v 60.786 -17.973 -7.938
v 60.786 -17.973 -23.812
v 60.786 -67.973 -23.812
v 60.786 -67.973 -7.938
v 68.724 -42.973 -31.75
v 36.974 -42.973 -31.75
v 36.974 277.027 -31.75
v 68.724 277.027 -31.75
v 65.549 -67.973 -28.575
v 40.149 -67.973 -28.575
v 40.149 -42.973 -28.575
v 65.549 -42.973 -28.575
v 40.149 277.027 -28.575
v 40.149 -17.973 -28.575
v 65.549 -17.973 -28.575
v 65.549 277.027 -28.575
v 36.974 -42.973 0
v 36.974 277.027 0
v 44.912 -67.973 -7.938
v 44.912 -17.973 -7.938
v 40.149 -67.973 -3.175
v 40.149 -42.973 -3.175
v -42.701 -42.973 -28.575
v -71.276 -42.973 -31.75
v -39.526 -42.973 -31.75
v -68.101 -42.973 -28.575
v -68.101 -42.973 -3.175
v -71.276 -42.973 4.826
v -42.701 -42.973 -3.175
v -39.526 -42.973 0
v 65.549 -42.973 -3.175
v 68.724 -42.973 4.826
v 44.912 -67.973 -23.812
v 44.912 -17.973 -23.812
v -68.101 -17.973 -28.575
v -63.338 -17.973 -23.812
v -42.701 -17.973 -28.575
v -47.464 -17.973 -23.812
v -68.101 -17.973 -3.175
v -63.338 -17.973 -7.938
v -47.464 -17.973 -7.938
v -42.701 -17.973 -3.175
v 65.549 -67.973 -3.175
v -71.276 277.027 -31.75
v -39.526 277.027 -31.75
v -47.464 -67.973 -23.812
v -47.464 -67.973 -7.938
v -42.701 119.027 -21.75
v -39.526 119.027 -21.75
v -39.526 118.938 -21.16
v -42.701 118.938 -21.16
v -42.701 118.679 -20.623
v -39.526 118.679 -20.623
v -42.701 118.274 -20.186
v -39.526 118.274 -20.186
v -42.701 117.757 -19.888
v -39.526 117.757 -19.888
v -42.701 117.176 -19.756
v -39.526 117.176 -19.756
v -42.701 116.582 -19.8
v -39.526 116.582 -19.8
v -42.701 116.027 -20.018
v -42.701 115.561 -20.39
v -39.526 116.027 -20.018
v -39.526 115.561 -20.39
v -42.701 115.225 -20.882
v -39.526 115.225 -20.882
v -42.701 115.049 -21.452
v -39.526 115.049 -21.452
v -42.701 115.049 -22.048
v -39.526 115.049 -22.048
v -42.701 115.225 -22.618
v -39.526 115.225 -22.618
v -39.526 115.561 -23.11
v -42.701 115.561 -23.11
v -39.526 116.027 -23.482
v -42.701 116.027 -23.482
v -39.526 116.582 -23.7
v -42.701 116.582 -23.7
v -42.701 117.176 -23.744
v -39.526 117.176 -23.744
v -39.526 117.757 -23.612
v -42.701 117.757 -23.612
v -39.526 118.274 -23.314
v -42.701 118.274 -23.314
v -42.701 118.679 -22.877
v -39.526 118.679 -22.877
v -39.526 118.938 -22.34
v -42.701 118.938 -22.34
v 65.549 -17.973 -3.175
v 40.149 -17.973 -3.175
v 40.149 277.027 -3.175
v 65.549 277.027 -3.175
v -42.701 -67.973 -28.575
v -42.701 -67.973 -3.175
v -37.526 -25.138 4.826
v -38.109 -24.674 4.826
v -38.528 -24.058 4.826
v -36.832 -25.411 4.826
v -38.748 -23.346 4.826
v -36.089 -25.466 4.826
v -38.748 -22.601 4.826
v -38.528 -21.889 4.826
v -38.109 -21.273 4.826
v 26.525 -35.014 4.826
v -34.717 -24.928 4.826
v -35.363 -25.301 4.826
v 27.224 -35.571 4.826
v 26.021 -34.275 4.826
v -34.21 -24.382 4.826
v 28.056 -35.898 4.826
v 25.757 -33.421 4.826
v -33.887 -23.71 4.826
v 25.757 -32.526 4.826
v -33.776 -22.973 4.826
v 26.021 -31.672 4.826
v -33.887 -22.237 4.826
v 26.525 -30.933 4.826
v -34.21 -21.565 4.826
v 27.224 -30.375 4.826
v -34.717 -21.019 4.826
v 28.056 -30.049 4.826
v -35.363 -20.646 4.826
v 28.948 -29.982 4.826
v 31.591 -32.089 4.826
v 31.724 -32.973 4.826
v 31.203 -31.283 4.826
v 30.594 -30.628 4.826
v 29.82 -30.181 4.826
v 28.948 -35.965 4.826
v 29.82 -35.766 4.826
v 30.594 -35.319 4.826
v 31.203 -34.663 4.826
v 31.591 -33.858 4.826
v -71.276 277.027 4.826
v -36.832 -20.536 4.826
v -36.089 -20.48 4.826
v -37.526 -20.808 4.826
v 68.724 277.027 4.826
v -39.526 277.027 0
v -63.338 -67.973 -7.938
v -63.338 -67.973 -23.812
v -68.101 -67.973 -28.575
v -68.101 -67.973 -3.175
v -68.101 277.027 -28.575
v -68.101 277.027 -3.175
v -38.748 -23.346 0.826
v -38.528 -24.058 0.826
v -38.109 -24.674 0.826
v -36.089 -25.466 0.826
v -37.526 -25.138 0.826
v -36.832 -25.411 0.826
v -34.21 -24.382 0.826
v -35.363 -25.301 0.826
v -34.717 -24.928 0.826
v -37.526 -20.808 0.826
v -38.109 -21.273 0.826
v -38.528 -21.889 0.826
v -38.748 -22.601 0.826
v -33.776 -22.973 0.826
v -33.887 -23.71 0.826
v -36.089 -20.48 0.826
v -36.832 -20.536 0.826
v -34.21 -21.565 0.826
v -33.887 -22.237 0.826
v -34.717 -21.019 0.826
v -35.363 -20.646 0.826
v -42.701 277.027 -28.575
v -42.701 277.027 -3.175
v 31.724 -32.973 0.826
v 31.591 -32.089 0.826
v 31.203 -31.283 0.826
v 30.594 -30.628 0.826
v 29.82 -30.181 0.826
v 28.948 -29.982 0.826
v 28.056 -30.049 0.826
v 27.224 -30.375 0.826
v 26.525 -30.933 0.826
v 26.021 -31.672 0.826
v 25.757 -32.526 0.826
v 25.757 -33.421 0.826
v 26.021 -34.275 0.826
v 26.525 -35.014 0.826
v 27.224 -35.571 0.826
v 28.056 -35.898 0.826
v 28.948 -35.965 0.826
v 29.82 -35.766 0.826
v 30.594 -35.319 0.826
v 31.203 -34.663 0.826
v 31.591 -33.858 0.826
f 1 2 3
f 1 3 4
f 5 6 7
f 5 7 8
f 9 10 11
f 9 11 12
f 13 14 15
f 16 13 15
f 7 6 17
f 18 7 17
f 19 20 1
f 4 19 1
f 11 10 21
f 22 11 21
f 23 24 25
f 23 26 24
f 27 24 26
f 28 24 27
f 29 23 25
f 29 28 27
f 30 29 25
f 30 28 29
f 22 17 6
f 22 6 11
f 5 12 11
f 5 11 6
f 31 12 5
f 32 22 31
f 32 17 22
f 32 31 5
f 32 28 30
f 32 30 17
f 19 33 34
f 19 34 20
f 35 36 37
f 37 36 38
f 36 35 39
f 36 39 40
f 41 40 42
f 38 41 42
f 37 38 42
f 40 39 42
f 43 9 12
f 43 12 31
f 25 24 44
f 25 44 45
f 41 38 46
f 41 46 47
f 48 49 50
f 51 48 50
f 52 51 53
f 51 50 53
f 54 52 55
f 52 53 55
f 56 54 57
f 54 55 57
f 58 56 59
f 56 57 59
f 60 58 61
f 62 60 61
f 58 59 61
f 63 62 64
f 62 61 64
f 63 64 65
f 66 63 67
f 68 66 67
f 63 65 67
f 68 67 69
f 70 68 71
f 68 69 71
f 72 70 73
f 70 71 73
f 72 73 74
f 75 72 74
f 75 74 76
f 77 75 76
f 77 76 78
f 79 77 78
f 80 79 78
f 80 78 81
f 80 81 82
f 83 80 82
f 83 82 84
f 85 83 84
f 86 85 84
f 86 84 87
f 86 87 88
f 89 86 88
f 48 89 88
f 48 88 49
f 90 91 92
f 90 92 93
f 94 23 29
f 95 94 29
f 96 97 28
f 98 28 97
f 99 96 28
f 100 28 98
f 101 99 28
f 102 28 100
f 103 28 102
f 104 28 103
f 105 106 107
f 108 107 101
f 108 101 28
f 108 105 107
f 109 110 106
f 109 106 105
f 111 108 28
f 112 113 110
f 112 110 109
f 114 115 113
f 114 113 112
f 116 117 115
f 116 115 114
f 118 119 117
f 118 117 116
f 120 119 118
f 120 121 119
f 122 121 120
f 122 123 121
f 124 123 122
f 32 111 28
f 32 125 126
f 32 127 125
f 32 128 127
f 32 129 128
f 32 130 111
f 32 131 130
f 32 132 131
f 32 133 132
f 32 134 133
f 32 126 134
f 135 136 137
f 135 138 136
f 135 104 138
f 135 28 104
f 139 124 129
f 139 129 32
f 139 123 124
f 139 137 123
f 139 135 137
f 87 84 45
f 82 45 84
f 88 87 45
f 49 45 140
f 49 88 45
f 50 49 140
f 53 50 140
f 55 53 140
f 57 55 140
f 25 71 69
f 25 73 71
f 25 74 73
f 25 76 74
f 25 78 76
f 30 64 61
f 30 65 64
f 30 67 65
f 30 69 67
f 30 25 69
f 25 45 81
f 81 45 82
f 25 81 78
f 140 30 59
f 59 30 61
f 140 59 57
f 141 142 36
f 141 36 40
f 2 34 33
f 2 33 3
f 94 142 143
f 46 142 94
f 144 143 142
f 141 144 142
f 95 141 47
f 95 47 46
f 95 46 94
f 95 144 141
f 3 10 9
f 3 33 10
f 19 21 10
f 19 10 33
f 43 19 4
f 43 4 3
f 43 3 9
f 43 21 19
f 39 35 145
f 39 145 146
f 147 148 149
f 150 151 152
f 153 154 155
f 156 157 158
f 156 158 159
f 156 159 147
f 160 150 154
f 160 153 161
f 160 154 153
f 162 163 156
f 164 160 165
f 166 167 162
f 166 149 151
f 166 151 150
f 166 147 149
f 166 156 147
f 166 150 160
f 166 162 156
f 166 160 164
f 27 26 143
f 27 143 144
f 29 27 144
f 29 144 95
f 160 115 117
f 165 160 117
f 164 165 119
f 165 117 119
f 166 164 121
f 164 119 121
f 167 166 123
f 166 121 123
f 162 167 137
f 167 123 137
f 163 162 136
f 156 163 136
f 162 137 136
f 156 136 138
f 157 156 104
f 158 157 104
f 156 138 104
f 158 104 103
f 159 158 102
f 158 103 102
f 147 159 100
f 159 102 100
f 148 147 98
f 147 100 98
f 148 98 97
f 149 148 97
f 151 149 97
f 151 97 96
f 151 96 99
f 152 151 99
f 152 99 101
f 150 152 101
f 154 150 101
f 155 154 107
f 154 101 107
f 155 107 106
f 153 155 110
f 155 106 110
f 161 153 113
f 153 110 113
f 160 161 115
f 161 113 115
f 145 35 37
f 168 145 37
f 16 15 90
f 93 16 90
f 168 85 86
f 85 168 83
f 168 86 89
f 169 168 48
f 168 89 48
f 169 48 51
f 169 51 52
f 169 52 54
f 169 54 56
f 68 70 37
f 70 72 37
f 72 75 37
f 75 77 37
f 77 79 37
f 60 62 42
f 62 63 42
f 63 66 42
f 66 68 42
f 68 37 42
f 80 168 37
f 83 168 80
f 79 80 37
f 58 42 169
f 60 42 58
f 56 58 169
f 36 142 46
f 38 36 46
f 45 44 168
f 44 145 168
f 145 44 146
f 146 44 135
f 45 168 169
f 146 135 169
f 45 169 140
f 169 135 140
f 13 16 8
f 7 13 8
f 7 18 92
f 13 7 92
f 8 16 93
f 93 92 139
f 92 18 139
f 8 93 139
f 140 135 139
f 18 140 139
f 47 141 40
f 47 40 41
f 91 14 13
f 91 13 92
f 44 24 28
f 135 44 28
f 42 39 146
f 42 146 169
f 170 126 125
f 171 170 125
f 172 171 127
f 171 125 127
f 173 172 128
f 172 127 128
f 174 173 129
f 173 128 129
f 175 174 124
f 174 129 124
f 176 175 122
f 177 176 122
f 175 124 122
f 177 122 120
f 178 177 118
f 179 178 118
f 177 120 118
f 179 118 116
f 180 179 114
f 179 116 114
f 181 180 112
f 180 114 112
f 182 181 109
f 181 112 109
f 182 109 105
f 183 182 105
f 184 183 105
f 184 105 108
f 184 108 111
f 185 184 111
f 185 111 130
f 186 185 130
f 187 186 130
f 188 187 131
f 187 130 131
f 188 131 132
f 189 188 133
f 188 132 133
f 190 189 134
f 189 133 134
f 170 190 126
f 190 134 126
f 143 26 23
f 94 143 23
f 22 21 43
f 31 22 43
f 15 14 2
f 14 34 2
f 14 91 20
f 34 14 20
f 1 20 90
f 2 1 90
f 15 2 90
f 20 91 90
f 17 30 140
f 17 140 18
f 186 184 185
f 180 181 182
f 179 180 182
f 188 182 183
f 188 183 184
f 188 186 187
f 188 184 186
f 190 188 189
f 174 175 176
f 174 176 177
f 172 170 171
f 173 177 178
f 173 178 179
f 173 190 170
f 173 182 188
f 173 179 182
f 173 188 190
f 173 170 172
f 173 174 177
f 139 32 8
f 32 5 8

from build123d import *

# Parameters (mm, degrees)
F0_W     = 140
F0_H     = 320
F1_DEPTH = 4.826
F2_W     = 31.75
F2_H     = 31.75
F2_W_2   = 25.4
F2_H_2   = 25.4
F3_DEPTH = 320
F4_W     = 25.4
F4_H     = 25.4
F4_W_2   = 15.874
F4_H_2   = 15.874
F5_DEPTH = 25
F6_R     = 2
F7_DEPTH = 4
F8_R     = 2.5
F8_R_2   = 3
F9_DEPTH = 4


with BuildPart() as f1:
    # F0 (on Top) → F1 (new body)
    with BuildSketch(Plane.XY):
        with Locations((-1.276044, 117.026612)):
            Rectangle(F0_W, F0_H)
    extrude(amount=F1_DEPTH)

    # F2 (on face) → F3 (join)
    with BuildSketch(Plane.XZ.offset(42.973388)):
        with Locations((-55.401044, -15.875)):
            Rectangle(F2_W, F2_H)
        with Locations((-55.401044, -15.875)):
            Rectangle(F2_W_2, F2_H_2, mode=Mode.SUBTRACT)
        with Locations((52.848956, -15.875)):
            Rectangle(F2_W, F2_H)
        with Locations((52.848956, -15.875)):
            Rectangle(F2_W_2, F2_H_2, mode=Mode.SUBTRACT)
    extrude(amount=-F3_DEPTH)

    # F4 (on face) → F5 (join, symmetric)
    with BuildSketch(Plane.XZ.offset(42.973388)):
        with Locations((-55.401044, -15.875)):
            Rectangle(F4_W, F4_H)
        with Locations((-55.401044, -15.875)):
            Rectangle(F4_W_2, F4_H_2, mode=Mode.SUBTRACT)
        with Locations((52.848956, -15.875)):
            Rectangle(F4_W, F4_H)
        with Locations((52.848956, -15.875)):
            Rectangle(F4_W_2, F4_H_2, mode=Mode.SUBTRACT)
    extrude(amount=F5_DEPTH, both=True)

    # F6 (on face) → F7 (cut)
    with BuildSketch(Plane.YZ.offset(-39.526044)):
        with Locations((117.026612, -21.75)):
            Circle(F6_R)
    extrude(amount=-F7_DEPTH, mode=Mode.SUBTRACT)

    # F8 (on face) → F9 (cut)
    with BuildSketch(Plane.XY.offset(4.826)):
        with Locations((-36.276044, -22.973388)):
            Circle(F8_R)
        with Locations((28.723956, -32.973388)):
            Circle(F8_R_2)
    extrude(amount=-F9_DEPTH, mode=Mode.SUBTRACT)


solid = f1.part
